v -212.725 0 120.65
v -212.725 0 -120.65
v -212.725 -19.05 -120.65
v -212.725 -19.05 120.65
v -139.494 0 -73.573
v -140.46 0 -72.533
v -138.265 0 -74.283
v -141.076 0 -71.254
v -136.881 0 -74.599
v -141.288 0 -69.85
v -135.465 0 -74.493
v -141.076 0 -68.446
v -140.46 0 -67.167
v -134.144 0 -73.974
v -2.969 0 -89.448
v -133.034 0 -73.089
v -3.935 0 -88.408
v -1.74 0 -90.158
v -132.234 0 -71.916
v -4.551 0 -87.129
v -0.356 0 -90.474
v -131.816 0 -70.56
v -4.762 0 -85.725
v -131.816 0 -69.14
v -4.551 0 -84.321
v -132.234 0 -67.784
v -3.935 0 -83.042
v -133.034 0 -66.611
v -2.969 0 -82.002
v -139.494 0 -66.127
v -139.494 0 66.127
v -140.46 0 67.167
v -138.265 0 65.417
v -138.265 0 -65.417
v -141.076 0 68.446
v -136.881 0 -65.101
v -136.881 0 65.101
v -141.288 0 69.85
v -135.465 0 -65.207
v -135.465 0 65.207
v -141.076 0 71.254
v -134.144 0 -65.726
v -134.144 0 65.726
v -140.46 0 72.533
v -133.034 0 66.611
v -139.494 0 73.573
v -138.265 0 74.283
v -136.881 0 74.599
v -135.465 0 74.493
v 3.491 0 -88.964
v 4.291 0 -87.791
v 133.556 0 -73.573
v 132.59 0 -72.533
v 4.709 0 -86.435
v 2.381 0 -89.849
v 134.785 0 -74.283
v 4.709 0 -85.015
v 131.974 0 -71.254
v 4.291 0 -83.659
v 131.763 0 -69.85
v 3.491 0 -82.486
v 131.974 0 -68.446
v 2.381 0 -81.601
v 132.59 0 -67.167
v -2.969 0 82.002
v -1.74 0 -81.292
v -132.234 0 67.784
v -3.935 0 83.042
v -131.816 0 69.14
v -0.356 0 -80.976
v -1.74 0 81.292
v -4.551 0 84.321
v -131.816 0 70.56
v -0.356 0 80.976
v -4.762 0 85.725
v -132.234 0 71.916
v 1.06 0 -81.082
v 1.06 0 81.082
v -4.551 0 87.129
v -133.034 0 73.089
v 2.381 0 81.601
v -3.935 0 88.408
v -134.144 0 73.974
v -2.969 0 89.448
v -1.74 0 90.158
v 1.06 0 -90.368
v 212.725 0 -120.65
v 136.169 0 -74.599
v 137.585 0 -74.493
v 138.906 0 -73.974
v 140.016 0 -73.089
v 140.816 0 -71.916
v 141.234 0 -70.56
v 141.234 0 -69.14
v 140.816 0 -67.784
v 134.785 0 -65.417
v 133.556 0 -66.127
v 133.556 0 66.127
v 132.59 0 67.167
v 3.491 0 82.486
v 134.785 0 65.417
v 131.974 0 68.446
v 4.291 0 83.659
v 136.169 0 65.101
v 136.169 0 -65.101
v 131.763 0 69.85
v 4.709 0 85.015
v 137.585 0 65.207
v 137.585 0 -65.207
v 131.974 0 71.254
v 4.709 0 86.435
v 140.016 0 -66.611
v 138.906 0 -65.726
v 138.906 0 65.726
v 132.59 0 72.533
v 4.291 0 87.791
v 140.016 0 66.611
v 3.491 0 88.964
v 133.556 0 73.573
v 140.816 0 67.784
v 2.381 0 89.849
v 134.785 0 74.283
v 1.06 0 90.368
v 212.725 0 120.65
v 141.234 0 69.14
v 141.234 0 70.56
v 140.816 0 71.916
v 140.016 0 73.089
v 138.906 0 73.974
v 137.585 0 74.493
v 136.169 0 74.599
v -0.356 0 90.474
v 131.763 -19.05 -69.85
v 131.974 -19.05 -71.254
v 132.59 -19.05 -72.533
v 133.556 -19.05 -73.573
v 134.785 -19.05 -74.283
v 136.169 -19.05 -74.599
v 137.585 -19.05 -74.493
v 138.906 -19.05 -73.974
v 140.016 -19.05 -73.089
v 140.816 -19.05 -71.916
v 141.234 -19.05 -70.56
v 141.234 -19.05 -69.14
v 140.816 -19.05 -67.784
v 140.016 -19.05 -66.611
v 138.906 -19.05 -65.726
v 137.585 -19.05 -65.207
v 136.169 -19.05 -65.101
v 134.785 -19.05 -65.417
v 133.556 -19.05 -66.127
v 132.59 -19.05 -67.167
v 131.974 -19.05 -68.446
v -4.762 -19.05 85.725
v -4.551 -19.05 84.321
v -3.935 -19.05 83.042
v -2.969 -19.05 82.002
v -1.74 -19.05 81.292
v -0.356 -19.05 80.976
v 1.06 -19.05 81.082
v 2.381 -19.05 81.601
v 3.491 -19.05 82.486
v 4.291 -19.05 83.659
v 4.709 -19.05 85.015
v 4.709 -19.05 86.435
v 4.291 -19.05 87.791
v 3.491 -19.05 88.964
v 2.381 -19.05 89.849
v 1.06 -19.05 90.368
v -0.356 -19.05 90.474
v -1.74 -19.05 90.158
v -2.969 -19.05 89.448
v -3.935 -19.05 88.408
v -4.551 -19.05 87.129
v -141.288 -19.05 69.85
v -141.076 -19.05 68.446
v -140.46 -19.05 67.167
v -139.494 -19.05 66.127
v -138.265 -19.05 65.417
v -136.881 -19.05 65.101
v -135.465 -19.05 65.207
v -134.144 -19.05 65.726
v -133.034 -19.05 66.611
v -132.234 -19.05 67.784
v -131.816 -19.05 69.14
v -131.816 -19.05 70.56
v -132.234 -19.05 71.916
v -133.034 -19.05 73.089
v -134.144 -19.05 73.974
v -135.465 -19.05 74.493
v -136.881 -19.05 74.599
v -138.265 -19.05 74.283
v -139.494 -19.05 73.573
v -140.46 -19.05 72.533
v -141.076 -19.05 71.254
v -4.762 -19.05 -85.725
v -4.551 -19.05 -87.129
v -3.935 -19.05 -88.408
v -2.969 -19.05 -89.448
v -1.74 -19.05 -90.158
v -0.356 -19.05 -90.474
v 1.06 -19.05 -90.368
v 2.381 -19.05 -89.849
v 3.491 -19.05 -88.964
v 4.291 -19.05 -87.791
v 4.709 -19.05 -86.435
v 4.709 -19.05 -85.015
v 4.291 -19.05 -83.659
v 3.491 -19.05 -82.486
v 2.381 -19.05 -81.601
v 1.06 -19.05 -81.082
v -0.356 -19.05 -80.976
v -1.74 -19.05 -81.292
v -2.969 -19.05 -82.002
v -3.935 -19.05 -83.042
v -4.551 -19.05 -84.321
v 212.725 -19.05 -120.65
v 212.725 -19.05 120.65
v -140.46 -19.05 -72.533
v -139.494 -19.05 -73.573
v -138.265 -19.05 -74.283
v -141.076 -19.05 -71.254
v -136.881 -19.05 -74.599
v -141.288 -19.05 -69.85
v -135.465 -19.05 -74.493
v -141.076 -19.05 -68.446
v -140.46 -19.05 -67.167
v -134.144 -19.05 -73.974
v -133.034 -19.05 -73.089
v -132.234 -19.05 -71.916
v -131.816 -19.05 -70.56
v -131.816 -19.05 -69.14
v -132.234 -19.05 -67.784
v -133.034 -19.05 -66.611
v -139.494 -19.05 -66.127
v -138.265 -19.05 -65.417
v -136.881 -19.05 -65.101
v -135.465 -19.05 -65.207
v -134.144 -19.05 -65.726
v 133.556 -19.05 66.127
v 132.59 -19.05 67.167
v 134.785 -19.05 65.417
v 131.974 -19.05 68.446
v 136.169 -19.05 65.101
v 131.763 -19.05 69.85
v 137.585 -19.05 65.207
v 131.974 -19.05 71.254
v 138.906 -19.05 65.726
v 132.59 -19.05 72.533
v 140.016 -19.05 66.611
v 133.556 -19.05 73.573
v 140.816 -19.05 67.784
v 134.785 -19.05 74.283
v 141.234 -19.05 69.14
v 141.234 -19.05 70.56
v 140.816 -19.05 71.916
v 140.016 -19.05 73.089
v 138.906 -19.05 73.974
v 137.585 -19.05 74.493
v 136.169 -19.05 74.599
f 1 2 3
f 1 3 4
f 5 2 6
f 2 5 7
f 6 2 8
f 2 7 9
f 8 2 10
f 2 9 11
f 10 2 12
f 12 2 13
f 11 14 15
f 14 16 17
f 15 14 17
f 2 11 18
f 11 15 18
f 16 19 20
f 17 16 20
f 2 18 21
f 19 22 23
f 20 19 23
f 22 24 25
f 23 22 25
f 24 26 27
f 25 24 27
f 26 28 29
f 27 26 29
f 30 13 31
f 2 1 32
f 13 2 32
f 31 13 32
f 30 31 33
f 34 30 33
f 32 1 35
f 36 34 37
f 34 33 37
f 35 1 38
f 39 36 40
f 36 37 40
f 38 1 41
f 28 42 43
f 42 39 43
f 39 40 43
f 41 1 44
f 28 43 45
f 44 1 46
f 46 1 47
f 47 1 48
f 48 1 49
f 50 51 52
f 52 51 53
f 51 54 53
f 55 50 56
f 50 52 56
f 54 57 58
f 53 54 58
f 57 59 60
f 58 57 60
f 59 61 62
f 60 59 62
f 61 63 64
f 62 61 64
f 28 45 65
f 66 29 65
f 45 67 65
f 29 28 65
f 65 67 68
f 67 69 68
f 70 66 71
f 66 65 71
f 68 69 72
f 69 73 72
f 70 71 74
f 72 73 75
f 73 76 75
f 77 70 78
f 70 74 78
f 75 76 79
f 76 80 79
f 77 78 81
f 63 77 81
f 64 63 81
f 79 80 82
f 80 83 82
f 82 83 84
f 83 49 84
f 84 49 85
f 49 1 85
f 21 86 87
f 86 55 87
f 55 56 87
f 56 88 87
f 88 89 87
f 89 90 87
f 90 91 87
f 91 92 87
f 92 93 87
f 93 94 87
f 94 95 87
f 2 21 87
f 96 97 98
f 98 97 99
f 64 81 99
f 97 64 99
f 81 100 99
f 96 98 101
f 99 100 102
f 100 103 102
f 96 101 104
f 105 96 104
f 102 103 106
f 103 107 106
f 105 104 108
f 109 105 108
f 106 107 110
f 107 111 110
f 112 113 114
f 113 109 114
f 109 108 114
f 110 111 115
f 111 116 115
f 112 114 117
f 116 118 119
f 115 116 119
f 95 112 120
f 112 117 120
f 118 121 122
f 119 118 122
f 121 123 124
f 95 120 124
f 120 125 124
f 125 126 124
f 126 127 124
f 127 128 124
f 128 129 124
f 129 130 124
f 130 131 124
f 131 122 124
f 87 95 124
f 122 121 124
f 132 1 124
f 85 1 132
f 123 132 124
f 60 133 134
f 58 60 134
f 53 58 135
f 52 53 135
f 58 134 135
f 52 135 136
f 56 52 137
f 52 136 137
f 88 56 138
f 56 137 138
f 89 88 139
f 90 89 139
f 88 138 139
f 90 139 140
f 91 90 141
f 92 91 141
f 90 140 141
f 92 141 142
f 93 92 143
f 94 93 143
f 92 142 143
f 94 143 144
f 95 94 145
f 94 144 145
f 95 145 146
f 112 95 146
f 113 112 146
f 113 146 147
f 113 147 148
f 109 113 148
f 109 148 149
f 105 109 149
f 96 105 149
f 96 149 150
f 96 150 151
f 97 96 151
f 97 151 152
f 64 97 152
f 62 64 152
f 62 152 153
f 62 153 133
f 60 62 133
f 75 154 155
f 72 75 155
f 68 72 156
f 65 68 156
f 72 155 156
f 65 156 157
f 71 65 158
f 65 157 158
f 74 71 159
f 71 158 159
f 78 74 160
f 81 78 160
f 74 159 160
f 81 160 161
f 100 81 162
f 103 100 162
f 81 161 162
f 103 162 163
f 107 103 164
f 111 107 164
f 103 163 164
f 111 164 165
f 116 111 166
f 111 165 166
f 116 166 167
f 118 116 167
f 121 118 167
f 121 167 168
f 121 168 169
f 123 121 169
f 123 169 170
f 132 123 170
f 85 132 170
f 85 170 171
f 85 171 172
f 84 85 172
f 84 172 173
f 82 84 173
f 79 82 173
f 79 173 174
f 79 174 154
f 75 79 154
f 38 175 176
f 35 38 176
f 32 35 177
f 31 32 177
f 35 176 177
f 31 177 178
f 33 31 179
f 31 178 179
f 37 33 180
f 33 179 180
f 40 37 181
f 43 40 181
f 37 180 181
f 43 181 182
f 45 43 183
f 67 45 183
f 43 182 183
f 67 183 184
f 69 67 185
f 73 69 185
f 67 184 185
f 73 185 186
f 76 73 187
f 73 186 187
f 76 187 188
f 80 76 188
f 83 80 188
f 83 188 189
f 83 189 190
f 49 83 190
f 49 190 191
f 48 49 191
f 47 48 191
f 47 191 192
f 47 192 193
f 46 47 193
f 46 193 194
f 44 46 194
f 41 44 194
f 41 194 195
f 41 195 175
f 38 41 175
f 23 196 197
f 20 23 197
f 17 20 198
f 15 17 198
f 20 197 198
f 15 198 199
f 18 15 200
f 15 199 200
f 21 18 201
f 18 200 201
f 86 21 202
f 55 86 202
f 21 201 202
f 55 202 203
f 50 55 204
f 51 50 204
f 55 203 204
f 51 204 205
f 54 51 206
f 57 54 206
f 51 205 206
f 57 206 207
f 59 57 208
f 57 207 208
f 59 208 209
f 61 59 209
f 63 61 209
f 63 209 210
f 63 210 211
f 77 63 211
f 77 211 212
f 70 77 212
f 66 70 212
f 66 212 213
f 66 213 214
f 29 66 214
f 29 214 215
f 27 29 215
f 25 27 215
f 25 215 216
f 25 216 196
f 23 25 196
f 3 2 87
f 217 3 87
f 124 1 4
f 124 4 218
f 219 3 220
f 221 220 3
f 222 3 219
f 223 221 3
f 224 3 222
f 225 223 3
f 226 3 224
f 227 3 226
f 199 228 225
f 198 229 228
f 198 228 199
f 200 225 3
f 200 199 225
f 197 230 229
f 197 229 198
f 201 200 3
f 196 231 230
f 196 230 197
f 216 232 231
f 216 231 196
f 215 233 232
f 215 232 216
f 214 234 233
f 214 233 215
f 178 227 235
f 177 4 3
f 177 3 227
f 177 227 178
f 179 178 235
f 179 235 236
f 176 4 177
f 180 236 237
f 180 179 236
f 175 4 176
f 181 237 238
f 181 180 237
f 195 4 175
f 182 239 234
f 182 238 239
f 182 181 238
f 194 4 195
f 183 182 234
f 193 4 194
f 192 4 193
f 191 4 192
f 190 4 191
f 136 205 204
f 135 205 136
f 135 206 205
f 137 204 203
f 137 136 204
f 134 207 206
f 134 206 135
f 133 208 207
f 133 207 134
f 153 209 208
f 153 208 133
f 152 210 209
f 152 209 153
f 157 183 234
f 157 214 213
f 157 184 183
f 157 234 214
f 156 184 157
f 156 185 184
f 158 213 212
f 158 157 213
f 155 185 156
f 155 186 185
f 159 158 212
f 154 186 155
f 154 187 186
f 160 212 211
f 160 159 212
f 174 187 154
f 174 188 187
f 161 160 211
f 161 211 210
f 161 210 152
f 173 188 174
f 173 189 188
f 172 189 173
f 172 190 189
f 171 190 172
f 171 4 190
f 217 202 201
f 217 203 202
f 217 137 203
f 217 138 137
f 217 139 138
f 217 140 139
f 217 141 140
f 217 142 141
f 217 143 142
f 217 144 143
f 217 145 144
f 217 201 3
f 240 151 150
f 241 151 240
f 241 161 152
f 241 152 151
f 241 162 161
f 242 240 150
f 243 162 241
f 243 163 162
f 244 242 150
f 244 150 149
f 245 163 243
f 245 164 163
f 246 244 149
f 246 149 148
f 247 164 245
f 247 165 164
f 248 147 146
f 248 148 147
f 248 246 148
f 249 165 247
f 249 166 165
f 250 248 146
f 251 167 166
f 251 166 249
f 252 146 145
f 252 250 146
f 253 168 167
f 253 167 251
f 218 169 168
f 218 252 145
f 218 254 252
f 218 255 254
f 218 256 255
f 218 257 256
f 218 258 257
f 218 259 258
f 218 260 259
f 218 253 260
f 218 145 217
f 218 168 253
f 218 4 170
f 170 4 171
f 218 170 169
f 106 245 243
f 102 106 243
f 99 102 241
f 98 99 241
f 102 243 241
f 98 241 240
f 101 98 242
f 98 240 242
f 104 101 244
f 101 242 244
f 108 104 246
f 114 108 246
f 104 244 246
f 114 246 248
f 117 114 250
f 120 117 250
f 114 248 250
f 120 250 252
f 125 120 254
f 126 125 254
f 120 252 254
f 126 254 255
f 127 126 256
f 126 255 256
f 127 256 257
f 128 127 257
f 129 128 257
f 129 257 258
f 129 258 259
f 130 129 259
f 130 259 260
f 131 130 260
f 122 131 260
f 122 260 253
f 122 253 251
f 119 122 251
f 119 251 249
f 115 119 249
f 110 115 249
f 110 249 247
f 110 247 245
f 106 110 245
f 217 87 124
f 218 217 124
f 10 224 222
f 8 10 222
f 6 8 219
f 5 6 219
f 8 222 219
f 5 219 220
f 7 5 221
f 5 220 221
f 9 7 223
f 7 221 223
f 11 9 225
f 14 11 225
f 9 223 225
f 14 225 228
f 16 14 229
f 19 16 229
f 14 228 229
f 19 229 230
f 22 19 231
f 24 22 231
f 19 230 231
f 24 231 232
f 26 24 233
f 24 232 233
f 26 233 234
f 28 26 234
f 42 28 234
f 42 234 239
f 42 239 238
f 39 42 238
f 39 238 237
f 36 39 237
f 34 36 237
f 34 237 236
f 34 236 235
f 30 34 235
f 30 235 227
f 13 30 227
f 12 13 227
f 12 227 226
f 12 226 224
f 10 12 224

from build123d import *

# Parameters (mm, degrees)
F0_W     = 425.45
F0_H     = 241.3
F1_DEPTH = 19.05
F2_D     = 9.525
F3_D     = 9.525
F4_D     = 9.525
F5_D     = 9.525
F6_D     = 9.525
F7_D     = 9.525


with BuildPart() as f1:
    # F0 (on Front) → F1 (new body)
    with BuildSketch(Plane.XZ):
        Rectangle(F0_W, F0_H)
    extrude(amount=F1_DEPTH)

    # F2 (through all)
    with Locations(Plane(origin=(0, 0, 0), x_dir=(1, 0, 0), z_dir=(0, 1, 0))):
        with Locations((136.525, 69.85)):
            Hole(F2_D / 2)

    # F3 (through all)
    with Locations(Plane(origin=(0, 0, 0), x_dir=(1, 0, 0), z_dir=(0, 1, 0))):
        with Locations((136.525, -69.85)):
            Hole(F3_D / 2)

    # F4 (through all)
    with Locations(Plane(origin=(0, 0, 0), x_dir=(1, 0, 0), z_dir=(0, 1, 0))):
        with Locations((-136.525, 69.85)):
            Hole(F4_D / 2)

    # F5 (through all)
    with Locations(Plane(origin=(0, 0, 0), x_dir=(1, 0, 0), z_dir=(0, 1, 0))):
        with Locations((-136.525, -69.85)):
            Hole(F5_D / 2)

    # F6 (through all)
    with Locations(Plane(origin=(0, 0, 0), x_dir=(1, 0, 0), z_dir=(0, 1, 0))):
        with Locations((0, 85.725)):
            Hole(F6_D / 2)

    # F7 (through all)
    with Locations(Plane(origin=(0, 0, 0), x_dir=(1, 0, 0), z_dir=(0, 1, 0))):
        with Locations((0, -85.725)):
            Hole(F7_D / 2)


solid = f1.part
